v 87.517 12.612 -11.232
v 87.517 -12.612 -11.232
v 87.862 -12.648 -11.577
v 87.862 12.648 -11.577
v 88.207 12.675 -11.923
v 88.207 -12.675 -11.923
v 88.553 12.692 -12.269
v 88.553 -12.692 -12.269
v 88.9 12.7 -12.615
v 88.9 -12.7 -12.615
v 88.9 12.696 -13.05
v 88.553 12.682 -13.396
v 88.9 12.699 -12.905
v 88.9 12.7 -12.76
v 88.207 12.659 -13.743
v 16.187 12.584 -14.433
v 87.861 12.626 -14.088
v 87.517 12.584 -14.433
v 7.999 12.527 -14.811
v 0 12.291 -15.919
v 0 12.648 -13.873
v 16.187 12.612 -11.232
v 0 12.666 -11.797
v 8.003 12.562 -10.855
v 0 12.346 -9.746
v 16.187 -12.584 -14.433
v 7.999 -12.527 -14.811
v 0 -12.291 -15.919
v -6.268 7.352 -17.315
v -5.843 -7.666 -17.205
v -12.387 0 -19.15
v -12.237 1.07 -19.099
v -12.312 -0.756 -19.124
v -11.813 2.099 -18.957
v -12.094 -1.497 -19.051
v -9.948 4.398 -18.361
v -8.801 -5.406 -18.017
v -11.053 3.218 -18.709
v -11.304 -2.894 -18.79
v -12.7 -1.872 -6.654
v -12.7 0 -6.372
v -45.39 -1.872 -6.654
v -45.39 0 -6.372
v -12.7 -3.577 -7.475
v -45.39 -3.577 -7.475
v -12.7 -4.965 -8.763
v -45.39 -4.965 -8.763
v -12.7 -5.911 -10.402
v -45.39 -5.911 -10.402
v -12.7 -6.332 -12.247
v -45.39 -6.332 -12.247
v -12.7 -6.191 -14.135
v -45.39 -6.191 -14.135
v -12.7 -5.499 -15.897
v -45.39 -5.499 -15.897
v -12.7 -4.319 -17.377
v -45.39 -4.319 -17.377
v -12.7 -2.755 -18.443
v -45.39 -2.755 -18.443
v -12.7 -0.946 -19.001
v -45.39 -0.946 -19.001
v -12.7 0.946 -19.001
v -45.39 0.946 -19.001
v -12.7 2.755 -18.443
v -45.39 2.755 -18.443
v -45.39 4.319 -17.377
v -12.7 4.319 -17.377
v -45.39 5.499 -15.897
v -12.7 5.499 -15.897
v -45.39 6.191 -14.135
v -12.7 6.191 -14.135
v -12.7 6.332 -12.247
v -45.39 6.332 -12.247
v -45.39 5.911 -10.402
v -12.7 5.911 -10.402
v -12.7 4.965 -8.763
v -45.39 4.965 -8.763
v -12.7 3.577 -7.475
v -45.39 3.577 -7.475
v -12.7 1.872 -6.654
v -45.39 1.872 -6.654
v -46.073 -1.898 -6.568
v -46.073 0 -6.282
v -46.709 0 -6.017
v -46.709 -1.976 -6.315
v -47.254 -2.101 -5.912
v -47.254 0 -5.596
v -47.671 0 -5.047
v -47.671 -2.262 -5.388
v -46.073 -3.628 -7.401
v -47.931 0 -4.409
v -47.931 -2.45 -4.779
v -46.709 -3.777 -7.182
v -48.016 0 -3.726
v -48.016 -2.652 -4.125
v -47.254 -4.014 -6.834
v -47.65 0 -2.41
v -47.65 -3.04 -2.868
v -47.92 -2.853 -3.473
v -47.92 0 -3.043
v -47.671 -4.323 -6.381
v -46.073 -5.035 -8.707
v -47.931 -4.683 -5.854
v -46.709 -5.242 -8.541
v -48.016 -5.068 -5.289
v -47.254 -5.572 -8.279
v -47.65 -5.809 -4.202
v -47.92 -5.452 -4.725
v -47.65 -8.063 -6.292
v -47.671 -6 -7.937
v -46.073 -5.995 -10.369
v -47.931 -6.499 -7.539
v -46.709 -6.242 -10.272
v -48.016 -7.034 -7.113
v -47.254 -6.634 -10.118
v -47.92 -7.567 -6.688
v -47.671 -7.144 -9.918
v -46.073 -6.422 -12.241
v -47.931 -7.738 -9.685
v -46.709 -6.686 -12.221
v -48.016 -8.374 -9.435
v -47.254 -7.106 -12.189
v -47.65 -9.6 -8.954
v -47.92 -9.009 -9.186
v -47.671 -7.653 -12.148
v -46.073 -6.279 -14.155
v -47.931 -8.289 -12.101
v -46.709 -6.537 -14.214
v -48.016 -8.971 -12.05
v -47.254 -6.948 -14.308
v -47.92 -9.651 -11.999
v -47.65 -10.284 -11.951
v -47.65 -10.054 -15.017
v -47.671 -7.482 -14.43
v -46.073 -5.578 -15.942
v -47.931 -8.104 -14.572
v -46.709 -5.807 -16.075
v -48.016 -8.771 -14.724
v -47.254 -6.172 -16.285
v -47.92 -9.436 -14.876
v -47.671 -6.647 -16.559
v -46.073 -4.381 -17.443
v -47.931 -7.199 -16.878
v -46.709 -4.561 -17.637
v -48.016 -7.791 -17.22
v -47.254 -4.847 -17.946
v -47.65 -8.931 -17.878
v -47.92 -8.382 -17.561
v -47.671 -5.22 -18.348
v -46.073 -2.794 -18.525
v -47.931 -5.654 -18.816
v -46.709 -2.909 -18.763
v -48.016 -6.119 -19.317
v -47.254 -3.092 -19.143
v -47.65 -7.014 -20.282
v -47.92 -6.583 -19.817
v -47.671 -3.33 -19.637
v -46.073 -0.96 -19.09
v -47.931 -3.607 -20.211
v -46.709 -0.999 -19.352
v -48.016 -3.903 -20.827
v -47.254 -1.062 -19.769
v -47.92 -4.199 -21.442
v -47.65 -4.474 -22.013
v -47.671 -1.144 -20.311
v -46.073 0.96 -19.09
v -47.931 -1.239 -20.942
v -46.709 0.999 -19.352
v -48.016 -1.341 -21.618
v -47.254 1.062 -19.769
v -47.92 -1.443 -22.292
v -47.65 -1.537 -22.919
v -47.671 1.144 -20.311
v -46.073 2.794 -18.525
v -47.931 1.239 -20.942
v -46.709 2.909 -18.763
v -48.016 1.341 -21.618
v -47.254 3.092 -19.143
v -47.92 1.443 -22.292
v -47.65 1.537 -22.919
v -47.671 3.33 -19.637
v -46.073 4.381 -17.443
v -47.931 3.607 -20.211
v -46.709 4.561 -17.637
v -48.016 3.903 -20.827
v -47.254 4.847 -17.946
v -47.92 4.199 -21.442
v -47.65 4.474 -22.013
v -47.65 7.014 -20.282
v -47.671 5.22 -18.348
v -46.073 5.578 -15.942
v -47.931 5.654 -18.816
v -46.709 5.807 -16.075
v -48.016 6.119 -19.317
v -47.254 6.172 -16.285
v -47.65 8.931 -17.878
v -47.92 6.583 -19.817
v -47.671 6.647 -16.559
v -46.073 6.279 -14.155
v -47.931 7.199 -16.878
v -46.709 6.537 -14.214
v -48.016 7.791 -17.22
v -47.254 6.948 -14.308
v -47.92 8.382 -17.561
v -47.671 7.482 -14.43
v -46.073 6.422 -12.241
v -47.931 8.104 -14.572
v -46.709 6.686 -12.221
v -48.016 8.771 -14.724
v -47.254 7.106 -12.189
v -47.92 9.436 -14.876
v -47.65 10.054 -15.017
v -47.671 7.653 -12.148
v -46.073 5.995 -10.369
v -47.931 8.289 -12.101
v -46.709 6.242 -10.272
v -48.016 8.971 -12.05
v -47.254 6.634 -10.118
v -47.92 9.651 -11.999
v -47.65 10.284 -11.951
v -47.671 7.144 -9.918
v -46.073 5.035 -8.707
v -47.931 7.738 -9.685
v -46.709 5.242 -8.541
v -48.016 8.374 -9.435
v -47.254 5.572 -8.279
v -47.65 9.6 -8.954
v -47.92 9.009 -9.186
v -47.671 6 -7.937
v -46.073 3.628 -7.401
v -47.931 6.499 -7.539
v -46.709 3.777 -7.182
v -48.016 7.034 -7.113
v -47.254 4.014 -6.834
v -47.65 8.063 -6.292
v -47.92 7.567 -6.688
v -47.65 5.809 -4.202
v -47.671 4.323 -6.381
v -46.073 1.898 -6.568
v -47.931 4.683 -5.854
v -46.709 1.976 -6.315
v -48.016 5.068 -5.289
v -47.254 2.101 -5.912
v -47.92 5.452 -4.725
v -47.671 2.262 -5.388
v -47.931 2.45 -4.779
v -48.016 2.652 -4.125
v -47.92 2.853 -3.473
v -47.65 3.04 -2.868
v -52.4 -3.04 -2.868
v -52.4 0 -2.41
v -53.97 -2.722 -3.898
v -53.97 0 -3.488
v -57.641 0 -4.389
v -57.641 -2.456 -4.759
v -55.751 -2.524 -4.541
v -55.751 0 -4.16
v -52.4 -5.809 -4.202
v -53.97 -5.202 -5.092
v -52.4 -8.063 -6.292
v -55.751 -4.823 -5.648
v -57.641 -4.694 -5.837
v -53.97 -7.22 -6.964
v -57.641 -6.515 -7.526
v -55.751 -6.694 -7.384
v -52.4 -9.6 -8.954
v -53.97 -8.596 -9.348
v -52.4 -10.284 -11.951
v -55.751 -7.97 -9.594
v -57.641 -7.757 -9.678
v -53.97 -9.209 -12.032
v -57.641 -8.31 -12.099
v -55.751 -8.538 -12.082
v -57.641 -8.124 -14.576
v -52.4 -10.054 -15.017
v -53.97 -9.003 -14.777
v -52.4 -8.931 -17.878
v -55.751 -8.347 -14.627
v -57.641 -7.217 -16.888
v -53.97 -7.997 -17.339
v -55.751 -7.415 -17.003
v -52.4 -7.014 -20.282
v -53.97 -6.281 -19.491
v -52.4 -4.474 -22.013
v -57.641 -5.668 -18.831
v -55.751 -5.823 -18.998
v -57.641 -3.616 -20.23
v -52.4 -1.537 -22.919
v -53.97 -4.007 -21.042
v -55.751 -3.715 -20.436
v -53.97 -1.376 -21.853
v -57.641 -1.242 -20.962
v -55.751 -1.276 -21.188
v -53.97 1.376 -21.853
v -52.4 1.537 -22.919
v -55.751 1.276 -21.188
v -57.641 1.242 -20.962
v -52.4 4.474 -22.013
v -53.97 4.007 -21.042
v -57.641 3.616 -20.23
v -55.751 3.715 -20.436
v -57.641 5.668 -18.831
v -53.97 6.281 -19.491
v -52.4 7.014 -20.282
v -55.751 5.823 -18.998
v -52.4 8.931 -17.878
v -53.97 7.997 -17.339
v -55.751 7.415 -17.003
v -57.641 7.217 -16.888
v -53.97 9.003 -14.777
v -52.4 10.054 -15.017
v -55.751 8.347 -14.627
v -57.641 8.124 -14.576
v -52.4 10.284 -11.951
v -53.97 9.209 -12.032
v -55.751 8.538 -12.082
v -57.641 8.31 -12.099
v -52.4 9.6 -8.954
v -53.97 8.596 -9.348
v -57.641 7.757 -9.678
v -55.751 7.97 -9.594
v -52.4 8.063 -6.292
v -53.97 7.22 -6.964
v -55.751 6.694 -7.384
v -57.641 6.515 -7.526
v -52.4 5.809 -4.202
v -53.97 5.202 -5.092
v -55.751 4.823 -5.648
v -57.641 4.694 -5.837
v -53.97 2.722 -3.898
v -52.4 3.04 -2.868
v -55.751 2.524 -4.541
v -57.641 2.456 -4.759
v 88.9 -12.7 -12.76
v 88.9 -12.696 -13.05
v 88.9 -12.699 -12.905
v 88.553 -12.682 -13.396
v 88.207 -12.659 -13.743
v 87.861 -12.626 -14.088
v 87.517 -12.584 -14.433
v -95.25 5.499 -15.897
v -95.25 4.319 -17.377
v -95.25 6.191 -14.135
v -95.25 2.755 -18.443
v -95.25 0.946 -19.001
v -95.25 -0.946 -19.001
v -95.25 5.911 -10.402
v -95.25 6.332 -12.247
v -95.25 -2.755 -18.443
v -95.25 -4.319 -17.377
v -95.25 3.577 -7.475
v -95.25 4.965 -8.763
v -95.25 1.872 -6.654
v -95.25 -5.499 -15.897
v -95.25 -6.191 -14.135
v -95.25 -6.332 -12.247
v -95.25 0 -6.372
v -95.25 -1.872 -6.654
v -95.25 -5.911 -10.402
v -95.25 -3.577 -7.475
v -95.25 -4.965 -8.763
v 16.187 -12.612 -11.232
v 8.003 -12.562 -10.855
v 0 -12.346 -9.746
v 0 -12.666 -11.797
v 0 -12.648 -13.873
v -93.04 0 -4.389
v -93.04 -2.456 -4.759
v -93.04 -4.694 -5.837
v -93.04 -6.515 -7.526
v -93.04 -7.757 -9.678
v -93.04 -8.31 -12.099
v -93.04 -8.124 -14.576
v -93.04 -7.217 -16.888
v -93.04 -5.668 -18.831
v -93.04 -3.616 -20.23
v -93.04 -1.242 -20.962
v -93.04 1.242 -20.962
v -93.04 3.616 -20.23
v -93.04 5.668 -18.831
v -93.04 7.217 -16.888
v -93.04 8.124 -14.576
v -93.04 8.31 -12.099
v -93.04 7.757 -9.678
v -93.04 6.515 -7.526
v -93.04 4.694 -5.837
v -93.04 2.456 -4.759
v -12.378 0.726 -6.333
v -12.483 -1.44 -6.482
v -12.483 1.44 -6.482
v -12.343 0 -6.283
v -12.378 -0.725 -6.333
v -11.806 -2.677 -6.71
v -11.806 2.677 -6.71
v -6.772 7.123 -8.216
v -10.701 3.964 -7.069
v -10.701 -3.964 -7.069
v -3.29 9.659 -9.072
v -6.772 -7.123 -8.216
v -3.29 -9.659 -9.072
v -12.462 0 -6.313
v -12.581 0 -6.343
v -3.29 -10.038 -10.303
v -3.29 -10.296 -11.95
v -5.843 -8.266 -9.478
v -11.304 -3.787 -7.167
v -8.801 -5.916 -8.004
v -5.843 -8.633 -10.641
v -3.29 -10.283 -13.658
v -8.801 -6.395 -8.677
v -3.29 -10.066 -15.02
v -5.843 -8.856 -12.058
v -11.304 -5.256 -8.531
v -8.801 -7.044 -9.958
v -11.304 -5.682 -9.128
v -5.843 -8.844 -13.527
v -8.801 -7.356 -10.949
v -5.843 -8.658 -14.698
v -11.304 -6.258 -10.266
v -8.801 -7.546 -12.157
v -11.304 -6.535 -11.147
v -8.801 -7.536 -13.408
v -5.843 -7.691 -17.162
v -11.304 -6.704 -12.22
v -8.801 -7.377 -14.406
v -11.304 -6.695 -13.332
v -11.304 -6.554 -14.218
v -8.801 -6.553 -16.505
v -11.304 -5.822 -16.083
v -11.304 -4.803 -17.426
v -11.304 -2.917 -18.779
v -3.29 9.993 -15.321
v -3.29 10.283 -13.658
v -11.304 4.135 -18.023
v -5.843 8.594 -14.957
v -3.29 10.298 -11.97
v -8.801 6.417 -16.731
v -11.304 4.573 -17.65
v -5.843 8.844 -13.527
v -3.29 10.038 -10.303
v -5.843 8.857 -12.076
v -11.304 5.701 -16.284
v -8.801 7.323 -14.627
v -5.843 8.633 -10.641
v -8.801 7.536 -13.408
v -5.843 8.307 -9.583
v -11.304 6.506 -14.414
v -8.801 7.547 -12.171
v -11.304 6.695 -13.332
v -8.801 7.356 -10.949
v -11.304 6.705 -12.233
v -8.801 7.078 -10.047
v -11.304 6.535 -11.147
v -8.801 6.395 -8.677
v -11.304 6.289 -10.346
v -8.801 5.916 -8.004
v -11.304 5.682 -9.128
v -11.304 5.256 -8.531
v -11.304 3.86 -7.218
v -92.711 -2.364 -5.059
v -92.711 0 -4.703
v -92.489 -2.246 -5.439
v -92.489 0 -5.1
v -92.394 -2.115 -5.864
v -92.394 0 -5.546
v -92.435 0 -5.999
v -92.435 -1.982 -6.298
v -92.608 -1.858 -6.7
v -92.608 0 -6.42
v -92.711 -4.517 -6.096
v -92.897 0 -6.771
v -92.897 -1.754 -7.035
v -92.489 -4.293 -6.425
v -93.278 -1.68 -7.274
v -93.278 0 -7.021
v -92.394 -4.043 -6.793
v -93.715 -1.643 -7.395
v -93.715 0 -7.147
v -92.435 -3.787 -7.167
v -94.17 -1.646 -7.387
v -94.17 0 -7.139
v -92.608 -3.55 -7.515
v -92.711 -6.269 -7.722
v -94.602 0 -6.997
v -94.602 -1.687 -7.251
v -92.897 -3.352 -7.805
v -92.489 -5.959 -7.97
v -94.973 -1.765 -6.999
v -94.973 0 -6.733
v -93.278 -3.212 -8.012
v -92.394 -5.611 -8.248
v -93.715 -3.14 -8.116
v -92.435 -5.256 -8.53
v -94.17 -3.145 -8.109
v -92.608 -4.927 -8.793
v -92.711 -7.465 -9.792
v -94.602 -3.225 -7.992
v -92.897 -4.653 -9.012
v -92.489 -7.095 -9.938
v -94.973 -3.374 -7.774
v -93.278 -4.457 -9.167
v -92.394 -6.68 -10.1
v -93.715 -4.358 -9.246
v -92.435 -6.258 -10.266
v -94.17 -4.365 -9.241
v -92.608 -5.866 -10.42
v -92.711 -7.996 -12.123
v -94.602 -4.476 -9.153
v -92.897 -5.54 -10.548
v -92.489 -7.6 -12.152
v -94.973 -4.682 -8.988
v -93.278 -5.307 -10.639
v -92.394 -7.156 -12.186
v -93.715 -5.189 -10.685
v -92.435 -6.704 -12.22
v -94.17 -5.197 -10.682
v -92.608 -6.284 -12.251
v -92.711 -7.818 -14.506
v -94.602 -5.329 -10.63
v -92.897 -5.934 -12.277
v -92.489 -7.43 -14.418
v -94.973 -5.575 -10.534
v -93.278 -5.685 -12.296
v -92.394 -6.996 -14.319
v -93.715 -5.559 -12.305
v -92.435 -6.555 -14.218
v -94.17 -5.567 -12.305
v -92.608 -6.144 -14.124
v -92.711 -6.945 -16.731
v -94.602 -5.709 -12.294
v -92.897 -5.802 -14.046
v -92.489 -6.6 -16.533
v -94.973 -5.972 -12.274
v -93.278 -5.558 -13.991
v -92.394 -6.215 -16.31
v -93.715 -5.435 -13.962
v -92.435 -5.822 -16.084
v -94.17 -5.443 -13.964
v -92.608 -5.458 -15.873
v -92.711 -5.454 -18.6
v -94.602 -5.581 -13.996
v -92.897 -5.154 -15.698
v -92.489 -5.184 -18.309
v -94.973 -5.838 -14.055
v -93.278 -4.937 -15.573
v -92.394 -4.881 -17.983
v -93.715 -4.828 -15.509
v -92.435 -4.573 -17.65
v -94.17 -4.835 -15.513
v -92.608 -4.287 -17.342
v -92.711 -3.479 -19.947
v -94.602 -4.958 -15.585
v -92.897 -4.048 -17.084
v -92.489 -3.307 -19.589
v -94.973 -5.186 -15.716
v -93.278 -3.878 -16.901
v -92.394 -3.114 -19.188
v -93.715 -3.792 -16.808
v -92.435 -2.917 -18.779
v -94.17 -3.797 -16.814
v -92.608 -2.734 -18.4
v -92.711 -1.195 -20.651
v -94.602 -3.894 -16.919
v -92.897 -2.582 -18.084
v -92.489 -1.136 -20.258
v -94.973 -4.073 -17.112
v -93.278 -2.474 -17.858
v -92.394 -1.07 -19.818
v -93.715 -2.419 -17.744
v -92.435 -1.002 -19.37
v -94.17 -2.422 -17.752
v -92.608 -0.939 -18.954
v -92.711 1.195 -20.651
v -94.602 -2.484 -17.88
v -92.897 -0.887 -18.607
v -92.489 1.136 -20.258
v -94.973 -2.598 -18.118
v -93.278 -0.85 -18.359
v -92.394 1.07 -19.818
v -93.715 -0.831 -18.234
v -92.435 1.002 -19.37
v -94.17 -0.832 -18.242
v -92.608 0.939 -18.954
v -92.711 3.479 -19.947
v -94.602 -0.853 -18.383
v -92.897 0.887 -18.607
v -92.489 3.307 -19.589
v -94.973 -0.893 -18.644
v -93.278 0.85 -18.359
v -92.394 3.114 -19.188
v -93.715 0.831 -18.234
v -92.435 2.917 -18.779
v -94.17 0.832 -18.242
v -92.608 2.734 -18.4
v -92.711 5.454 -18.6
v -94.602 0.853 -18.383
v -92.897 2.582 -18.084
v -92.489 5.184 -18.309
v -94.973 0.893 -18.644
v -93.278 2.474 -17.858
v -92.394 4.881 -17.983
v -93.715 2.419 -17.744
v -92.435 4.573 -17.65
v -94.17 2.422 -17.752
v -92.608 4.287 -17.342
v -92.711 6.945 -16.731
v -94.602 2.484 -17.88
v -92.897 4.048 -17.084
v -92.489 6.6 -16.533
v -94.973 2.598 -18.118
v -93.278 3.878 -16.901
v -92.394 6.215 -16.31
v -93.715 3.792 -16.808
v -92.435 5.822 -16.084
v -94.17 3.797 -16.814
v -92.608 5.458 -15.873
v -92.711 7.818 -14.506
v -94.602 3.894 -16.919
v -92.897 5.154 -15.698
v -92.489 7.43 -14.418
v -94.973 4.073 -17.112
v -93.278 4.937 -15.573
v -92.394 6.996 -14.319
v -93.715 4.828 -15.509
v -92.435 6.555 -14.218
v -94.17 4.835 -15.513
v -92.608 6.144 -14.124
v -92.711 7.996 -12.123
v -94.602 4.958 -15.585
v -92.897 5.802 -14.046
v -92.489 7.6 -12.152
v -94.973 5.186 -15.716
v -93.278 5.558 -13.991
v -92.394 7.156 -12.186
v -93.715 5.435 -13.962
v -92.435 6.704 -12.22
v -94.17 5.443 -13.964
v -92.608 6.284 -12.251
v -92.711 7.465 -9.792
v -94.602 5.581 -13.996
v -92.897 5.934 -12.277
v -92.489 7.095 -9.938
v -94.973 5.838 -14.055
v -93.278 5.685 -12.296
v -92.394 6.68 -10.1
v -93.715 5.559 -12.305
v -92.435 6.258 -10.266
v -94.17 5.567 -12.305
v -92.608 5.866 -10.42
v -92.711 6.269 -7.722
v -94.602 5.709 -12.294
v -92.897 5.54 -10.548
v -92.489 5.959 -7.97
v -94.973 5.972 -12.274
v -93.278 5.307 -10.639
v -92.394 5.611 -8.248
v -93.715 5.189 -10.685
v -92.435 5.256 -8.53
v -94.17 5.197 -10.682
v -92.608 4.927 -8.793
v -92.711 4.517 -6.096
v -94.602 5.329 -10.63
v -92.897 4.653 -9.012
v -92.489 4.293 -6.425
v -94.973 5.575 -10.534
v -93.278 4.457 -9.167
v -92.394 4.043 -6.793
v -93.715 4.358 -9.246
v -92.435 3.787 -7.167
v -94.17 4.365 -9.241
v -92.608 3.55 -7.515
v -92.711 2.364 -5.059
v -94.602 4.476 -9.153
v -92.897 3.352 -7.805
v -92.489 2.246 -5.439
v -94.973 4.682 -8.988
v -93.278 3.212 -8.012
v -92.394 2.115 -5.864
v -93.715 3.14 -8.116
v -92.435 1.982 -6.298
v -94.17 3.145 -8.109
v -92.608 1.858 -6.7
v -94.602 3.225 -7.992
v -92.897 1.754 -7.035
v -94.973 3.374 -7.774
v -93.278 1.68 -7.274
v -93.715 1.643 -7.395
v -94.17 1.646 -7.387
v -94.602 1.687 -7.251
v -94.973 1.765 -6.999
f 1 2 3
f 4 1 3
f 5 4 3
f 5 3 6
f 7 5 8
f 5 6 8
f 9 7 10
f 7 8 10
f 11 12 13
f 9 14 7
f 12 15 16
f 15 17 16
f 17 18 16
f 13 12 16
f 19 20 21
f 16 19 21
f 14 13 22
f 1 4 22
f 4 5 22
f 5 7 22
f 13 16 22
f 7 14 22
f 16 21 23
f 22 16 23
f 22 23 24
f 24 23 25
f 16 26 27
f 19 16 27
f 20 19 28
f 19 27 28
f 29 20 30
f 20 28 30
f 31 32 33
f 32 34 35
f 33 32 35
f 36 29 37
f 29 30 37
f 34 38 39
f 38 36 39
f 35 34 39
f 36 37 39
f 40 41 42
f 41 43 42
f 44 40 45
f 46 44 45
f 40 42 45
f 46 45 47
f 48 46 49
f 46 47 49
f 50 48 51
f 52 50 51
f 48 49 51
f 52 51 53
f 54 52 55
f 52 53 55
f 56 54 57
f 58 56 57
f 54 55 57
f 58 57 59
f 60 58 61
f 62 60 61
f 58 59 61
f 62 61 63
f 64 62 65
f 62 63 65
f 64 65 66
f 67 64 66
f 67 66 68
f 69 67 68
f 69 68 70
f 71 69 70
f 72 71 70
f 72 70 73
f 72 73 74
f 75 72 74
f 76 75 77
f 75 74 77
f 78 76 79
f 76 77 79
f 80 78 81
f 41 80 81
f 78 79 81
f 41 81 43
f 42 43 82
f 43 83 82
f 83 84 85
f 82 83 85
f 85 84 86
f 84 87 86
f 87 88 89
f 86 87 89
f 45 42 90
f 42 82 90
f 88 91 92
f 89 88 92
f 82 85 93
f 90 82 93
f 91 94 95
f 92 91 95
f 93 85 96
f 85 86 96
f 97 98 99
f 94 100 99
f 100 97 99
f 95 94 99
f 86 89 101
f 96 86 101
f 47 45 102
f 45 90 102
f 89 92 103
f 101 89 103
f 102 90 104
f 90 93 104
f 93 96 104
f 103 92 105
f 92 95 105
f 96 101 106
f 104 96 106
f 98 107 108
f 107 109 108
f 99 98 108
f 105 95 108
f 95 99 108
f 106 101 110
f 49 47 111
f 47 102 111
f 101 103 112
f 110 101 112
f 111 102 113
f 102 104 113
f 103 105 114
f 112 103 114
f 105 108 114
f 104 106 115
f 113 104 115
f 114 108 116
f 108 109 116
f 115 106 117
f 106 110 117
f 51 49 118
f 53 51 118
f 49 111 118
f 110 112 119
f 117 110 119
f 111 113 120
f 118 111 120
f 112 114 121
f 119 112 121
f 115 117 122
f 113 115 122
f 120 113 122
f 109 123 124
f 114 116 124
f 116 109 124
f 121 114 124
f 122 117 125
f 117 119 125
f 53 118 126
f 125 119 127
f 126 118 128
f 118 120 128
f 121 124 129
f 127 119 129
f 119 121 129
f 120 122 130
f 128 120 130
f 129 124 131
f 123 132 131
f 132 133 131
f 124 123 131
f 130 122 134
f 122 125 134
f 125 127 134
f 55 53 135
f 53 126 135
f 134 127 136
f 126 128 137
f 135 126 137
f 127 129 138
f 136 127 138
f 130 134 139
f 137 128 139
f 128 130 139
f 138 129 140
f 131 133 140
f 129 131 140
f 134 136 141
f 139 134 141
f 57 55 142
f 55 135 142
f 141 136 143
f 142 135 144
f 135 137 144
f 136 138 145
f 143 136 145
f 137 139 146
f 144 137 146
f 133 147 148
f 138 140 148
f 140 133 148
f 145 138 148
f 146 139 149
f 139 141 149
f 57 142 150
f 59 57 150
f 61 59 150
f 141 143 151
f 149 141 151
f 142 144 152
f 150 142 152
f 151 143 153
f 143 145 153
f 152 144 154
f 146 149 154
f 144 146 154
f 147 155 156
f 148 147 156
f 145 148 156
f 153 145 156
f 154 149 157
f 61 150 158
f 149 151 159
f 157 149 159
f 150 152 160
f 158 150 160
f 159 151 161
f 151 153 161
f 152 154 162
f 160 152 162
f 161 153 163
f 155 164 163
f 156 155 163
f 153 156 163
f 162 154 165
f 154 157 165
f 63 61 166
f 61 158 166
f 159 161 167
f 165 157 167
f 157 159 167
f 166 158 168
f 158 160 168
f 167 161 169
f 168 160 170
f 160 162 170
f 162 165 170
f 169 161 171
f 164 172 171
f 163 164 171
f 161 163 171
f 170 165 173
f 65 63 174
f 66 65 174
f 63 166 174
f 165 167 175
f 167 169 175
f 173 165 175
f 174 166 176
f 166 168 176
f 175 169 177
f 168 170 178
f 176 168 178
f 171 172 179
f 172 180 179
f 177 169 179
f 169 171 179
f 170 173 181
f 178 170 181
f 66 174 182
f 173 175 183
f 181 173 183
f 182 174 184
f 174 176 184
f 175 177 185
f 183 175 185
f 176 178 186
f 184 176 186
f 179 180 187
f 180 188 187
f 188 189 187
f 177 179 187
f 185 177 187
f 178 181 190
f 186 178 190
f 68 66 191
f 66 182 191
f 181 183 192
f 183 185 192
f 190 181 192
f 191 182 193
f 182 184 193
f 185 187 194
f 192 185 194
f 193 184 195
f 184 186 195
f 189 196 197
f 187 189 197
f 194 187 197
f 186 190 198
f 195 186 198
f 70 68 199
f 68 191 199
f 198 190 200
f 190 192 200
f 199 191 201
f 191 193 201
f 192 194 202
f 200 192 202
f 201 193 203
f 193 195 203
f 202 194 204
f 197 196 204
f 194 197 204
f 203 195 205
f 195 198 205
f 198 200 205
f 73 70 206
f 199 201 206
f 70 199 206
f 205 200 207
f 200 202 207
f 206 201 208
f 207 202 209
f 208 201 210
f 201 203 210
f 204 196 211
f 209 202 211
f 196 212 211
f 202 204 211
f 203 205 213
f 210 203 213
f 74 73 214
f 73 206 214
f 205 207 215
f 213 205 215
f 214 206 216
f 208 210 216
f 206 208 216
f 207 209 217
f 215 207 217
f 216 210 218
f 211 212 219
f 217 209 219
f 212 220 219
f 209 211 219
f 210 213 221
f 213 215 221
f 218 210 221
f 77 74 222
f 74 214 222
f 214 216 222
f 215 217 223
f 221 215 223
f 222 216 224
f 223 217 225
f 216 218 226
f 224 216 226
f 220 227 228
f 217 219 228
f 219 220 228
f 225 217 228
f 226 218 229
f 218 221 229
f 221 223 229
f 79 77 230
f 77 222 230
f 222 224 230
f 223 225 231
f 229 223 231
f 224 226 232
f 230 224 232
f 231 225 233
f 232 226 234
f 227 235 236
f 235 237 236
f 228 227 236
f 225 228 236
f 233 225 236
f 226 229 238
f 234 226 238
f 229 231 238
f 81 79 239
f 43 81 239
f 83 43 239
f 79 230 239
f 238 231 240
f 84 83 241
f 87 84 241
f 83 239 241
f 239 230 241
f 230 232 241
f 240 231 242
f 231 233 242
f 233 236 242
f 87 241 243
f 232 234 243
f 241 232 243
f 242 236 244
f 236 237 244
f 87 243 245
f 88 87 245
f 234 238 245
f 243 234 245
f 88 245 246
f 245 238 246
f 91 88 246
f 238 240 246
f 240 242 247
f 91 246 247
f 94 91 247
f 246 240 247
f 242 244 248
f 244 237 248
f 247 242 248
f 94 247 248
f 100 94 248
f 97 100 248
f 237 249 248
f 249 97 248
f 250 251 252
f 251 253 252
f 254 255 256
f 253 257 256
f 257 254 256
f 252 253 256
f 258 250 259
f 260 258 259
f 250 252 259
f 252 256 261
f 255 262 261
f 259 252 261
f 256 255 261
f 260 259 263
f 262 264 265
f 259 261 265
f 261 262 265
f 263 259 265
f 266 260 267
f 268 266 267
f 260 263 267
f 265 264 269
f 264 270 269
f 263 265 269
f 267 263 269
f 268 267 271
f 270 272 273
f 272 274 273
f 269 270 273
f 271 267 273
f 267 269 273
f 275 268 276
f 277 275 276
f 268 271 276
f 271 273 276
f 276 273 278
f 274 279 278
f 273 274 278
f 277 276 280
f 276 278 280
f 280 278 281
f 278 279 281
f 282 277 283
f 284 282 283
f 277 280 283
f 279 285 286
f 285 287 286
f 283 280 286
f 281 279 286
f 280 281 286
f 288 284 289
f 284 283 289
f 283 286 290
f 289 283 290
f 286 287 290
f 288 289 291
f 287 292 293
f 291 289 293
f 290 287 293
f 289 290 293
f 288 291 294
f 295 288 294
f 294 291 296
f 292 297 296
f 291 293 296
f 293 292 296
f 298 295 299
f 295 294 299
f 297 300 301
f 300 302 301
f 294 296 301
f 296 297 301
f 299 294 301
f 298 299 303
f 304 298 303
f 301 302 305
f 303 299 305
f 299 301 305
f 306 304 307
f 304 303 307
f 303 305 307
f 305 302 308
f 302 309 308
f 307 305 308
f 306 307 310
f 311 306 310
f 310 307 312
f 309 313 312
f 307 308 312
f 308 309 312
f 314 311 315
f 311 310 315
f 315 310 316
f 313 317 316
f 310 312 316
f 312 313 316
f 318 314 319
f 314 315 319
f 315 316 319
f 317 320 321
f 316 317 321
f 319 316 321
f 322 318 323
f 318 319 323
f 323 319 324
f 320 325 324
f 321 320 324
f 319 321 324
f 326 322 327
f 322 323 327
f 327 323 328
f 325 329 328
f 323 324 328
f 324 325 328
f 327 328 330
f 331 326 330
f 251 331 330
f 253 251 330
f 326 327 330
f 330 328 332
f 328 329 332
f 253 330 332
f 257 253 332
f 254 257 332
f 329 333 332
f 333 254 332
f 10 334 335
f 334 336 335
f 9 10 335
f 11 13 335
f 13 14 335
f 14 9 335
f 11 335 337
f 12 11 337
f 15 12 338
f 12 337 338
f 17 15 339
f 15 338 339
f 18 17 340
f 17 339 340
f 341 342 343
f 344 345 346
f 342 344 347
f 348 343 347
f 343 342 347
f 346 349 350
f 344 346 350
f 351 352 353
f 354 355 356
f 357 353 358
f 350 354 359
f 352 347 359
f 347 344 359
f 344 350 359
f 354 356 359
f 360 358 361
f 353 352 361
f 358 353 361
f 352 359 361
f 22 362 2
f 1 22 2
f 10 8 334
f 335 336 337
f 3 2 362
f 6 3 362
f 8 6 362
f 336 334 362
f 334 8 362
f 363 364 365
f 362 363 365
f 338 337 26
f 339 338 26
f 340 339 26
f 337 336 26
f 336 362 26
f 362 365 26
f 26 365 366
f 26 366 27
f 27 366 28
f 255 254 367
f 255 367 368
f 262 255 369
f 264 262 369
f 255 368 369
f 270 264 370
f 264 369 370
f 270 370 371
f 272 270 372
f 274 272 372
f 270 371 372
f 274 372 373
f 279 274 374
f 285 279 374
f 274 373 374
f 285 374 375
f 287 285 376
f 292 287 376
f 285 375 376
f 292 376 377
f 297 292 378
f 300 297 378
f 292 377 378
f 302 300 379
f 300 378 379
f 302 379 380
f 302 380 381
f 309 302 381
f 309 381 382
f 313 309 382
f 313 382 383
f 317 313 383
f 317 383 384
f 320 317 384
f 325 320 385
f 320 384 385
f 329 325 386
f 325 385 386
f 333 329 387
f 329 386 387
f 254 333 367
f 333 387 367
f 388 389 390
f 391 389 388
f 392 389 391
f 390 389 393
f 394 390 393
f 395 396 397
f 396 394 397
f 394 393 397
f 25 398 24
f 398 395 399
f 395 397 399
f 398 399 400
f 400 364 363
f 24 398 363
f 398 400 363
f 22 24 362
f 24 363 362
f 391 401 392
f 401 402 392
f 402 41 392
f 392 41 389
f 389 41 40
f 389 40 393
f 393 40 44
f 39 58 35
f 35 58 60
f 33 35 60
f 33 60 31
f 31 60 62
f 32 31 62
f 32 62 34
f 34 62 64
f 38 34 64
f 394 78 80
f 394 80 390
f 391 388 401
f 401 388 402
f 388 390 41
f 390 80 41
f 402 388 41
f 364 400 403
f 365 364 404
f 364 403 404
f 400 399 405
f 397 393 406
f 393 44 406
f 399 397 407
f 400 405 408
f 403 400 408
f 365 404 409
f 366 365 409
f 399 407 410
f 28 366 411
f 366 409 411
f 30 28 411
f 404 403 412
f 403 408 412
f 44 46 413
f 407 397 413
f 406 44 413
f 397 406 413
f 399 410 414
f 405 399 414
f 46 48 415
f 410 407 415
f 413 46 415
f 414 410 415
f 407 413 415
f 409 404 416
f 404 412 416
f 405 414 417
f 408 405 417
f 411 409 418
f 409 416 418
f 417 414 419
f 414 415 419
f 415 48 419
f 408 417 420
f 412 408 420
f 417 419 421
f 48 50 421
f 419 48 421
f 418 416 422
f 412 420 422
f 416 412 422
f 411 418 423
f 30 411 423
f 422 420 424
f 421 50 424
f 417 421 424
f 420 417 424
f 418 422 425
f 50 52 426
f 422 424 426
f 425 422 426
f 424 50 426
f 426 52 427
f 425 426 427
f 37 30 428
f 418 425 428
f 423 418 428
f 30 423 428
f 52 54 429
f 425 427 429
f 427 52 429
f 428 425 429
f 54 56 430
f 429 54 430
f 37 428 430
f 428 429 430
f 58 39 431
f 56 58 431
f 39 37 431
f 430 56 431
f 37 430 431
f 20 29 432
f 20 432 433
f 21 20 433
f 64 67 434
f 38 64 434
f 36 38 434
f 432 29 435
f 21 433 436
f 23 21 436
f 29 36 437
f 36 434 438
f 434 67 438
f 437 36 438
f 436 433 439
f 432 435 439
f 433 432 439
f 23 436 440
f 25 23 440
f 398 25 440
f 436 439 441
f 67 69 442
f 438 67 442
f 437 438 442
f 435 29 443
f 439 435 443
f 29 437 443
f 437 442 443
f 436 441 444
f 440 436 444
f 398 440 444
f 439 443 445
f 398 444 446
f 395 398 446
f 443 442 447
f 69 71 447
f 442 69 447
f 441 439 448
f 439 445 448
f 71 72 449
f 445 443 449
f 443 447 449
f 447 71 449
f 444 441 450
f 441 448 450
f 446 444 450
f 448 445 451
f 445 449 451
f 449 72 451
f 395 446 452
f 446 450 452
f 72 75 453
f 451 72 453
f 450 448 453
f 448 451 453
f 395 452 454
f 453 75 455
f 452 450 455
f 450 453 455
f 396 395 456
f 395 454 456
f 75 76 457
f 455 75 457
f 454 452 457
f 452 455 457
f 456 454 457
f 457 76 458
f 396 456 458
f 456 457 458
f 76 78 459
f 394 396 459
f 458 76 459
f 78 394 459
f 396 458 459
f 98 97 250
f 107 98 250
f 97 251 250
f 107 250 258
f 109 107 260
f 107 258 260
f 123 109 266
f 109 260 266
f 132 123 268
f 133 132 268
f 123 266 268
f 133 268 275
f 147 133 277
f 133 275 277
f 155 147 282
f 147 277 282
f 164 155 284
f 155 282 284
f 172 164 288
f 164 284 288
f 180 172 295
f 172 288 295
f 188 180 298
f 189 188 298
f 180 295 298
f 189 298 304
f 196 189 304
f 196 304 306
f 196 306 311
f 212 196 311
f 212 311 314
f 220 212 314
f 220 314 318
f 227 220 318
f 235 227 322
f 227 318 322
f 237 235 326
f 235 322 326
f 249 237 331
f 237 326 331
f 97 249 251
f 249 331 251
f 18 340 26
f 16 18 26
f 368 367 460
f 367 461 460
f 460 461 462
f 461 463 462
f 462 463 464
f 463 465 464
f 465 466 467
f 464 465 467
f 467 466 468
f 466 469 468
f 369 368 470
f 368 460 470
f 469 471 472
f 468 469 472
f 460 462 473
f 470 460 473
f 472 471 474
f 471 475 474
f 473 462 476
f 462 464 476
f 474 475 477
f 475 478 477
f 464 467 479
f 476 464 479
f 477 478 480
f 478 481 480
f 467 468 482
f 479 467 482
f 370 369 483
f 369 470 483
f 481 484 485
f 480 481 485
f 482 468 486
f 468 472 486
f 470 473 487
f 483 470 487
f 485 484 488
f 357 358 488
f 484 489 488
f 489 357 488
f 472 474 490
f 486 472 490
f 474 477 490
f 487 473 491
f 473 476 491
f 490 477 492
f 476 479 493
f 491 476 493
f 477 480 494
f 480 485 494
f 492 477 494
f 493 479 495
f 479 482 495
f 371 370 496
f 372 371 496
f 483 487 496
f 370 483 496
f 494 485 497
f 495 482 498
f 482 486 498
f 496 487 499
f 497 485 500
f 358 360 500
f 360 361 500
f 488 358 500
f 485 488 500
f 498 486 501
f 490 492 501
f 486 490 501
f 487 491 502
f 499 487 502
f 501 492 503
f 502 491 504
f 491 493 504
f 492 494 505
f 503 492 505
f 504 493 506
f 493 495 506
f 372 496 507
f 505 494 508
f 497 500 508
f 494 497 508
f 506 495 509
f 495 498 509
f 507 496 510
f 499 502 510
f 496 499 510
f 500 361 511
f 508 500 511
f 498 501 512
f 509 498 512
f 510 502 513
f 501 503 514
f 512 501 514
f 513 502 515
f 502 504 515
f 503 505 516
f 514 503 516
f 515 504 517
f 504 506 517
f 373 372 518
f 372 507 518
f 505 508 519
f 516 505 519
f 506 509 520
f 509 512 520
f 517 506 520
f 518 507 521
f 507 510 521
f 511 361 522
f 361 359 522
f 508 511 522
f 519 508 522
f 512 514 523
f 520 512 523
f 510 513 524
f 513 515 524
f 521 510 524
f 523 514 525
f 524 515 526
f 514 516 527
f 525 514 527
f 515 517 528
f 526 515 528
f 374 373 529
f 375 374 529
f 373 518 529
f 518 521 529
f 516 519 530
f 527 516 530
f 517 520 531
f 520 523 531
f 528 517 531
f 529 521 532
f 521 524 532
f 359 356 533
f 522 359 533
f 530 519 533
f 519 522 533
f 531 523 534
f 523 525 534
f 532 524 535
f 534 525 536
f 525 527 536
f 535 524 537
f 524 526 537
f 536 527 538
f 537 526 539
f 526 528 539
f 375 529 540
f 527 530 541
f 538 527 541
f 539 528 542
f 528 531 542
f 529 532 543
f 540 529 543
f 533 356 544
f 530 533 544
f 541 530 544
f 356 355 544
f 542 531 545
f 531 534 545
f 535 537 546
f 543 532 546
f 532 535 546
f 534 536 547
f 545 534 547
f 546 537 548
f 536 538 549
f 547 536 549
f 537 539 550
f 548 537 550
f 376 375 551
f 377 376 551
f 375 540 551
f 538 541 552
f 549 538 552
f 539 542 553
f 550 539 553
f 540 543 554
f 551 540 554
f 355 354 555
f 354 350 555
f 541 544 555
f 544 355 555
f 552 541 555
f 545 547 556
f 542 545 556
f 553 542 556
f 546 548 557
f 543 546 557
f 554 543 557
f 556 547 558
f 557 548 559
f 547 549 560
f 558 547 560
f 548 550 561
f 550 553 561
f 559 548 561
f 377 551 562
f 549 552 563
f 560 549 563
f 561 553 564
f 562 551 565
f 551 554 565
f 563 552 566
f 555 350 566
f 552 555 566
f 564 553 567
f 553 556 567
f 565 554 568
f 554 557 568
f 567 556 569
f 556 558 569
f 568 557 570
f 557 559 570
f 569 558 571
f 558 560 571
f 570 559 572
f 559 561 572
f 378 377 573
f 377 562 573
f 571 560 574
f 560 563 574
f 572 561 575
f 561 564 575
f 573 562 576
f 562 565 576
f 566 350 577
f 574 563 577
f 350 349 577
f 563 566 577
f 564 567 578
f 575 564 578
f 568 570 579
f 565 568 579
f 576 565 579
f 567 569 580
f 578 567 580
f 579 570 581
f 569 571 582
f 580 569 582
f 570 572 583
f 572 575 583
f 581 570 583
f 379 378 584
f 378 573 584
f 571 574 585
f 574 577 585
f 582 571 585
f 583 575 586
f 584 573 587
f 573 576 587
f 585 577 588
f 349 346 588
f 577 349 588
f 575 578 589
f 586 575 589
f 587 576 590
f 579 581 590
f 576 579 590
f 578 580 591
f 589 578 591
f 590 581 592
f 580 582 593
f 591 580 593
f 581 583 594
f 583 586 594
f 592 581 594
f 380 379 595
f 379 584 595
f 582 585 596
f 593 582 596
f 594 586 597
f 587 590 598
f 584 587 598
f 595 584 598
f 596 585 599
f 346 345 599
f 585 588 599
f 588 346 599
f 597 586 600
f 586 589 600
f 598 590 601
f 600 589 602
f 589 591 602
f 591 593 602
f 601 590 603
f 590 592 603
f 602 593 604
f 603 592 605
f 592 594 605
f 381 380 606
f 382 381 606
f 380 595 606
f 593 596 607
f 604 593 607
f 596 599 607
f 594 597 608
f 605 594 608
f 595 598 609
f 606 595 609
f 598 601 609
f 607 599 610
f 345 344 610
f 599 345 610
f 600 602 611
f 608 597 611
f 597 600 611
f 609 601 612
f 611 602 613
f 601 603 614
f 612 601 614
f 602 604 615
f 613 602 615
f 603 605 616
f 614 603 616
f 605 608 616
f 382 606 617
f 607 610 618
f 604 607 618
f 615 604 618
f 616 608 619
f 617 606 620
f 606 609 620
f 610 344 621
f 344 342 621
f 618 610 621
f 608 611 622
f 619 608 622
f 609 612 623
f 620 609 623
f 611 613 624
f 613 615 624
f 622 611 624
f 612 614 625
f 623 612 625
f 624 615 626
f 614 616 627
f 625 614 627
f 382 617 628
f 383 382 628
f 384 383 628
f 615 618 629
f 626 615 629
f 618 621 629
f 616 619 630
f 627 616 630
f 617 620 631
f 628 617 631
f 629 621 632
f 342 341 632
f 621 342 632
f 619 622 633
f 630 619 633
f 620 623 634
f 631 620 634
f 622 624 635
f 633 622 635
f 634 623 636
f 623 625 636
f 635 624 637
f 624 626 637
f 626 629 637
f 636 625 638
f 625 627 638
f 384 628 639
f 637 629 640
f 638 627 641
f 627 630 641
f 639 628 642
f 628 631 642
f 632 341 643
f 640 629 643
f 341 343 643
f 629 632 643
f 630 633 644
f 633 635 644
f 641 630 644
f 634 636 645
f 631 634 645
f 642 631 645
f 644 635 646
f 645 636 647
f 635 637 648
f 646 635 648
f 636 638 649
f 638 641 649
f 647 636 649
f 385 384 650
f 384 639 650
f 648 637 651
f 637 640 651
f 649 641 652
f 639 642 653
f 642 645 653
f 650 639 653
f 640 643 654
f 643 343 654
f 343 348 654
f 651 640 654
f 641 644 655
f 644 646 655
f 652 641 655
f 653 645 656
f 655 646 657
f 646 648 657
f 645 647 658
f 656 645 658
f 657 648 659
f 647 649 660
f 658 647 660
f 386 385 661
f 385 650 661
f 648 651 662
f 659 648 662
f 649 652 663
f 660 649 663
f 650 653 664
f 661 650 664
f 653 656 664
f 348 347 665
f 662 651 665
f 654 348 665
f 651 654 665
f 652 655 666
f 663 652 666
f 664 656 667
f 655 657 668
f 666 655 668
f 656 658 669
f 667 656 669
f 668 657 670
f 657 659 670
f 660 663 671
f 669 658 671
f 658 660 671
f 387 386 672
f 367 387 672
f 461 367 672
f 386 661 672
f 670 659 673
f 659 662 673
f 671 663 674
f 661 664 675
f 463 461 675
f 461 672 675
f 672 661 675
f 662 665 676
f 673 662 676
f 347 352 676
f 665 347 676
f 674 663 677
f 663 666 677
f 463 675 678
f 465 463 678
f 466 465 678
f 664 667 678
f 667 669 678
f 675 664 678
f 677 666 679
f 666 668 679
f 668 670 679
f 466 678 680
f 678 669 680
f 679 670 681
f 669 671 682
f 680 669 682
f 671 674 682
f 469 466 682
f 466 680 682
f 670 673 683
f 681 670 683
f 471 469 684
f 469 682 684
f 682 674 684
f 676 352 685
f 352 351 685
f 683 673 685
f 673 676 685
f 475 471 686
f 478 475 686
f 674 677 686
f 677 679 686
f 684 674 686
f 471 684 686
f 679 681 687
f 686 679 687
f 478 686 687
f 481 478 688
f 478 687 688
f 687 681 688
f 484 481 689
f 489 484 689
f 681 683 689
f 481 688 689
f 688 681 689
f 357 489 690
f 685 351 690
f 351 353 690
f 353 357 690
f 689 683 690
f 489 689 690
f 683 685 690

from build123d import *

# Parameters (mm, degrees)
F3_DEPTH = 25.4
F4_DEPTH = 25.4


with BuildPart() as f1:
    # F0 (on Front) → F1 (revolve)
    with BuildSketch(Plane.XZ):
        with BuildLine():
            Line((-95.25, -6.372012), (-95.25, -12.722012))
            Line((-95.25, -12.722012), (88.9, -12.722012))
            Line((88.9, -12.722012), (88.9, -0.022012))
            Line((88.9, -0.022012), (0, -0.022012))
            ThreePointArc((0, -0.022012), (-5.990472, -3.916067), (-12.7, -6.372012))
            Line((-12.7, -6.372012), (-45.3898, -6.372012))
            ThreePointArc((-45.3898, -6.372012), (-47.67075, -5.047272), (-47.6504, -2.409612))
            Line((-47.6504, -2.409612), (-52.4002, -2.409612))
            ThreePointArc((-52.4002, -2.409612), (-54.839819, -3.877688), (-57.640804, -4.389037))
            Line((-57.640804, -4.389037), (-93.039957, -4.389037))
            ThreePointArc((-93.039957, -4.389037), (-92.897345, -6.771022), (-95.25, -6.372012))
        make_face()
    revolve(axis=Axis((-3.175, 0, -12.722012), (1, 0, 0)))

    # F2 (on Front) → F3 (cut)
    with BuildSketch(Plane.XZ):
        with BuildLine():
            ThreePointArc((-12.482816, -6.482415), (1.656656, -10.036727), (16.186922, -11.232215))
            Line((16.186922, -11.232215), (87.516984, -11.232215))
            Line((87.516984, -11.232215), (89.117184, -12.832415))
            Line((89.117184, -12.832415), (96.563645, 18.124769))
            Line((96.563645, 18.124769), (7.196714, 21.508439))
            Line((7.196714, 21.508439), (-12.482816, -6.482415))
        make_face()
        with BuildLine():
            Line((96.563645, -43.789599), (89.117184, -12.832415))
            Line((89.117184, -12.832415), (87.516984, -14.432615))
            Line((87.516984, -14.432615), (16.186922, -14.432615))
            ThreePointArc((16.186922, -14.432615), (1.656656, -15.628103), (-12.482816, -19.182415))
            Line((-12.482816, -19.182415), (7.196714, -47.173269))
            Line((7.196714, -47.173269), (96.563645, -43.789599))
        make_face()
    extrude(amount=-F3_DEPTH, mode=Mode.SUBTRACT)

    # F2 (on Front) → F4 (cut)
    with BuildSketch(Plane.XZ):
        with BuildLine():
            ThreePointArc((-12.482816, -6.482415), (1.656656, -10.036727), (16.186922, -11.232215))
            Line((16.186922, -11.232215), (87.516984, -11.232215))
            Line((87.516984, -11.232215), (89.117184, -12.832415))
            Line((89.117184, -12.832415), (96.563645, 18.124769))
            Line((96.563645, 18.124769), (7.196714, 21.508439))
            Line((7.196714, 21.508439), (-12.482816, -6.482415))
        make_face()
        with BuildLine():
            Line((96.563645, -43.789599), (89.117184, -12.832415))
            Line((89.117184, -12.832415), (87.516984, -14.432615))
            Line((87.516984, -14.432615), (16.186922, -14.432615))
            ThreePointArc((16.186922, -14.432615), (1.656656, -15.628103), (-12.482816, -19.182415))
            Line((-12.482816, -19.182415), (7.196714, -47.173269))
            Line((7.196714, -47.173269), (96.563645, -43.789599))
        make_face()
    extrude(amount=F4_DEPTH, mode=Mode.SUBTRACT)


solid = f1.part
